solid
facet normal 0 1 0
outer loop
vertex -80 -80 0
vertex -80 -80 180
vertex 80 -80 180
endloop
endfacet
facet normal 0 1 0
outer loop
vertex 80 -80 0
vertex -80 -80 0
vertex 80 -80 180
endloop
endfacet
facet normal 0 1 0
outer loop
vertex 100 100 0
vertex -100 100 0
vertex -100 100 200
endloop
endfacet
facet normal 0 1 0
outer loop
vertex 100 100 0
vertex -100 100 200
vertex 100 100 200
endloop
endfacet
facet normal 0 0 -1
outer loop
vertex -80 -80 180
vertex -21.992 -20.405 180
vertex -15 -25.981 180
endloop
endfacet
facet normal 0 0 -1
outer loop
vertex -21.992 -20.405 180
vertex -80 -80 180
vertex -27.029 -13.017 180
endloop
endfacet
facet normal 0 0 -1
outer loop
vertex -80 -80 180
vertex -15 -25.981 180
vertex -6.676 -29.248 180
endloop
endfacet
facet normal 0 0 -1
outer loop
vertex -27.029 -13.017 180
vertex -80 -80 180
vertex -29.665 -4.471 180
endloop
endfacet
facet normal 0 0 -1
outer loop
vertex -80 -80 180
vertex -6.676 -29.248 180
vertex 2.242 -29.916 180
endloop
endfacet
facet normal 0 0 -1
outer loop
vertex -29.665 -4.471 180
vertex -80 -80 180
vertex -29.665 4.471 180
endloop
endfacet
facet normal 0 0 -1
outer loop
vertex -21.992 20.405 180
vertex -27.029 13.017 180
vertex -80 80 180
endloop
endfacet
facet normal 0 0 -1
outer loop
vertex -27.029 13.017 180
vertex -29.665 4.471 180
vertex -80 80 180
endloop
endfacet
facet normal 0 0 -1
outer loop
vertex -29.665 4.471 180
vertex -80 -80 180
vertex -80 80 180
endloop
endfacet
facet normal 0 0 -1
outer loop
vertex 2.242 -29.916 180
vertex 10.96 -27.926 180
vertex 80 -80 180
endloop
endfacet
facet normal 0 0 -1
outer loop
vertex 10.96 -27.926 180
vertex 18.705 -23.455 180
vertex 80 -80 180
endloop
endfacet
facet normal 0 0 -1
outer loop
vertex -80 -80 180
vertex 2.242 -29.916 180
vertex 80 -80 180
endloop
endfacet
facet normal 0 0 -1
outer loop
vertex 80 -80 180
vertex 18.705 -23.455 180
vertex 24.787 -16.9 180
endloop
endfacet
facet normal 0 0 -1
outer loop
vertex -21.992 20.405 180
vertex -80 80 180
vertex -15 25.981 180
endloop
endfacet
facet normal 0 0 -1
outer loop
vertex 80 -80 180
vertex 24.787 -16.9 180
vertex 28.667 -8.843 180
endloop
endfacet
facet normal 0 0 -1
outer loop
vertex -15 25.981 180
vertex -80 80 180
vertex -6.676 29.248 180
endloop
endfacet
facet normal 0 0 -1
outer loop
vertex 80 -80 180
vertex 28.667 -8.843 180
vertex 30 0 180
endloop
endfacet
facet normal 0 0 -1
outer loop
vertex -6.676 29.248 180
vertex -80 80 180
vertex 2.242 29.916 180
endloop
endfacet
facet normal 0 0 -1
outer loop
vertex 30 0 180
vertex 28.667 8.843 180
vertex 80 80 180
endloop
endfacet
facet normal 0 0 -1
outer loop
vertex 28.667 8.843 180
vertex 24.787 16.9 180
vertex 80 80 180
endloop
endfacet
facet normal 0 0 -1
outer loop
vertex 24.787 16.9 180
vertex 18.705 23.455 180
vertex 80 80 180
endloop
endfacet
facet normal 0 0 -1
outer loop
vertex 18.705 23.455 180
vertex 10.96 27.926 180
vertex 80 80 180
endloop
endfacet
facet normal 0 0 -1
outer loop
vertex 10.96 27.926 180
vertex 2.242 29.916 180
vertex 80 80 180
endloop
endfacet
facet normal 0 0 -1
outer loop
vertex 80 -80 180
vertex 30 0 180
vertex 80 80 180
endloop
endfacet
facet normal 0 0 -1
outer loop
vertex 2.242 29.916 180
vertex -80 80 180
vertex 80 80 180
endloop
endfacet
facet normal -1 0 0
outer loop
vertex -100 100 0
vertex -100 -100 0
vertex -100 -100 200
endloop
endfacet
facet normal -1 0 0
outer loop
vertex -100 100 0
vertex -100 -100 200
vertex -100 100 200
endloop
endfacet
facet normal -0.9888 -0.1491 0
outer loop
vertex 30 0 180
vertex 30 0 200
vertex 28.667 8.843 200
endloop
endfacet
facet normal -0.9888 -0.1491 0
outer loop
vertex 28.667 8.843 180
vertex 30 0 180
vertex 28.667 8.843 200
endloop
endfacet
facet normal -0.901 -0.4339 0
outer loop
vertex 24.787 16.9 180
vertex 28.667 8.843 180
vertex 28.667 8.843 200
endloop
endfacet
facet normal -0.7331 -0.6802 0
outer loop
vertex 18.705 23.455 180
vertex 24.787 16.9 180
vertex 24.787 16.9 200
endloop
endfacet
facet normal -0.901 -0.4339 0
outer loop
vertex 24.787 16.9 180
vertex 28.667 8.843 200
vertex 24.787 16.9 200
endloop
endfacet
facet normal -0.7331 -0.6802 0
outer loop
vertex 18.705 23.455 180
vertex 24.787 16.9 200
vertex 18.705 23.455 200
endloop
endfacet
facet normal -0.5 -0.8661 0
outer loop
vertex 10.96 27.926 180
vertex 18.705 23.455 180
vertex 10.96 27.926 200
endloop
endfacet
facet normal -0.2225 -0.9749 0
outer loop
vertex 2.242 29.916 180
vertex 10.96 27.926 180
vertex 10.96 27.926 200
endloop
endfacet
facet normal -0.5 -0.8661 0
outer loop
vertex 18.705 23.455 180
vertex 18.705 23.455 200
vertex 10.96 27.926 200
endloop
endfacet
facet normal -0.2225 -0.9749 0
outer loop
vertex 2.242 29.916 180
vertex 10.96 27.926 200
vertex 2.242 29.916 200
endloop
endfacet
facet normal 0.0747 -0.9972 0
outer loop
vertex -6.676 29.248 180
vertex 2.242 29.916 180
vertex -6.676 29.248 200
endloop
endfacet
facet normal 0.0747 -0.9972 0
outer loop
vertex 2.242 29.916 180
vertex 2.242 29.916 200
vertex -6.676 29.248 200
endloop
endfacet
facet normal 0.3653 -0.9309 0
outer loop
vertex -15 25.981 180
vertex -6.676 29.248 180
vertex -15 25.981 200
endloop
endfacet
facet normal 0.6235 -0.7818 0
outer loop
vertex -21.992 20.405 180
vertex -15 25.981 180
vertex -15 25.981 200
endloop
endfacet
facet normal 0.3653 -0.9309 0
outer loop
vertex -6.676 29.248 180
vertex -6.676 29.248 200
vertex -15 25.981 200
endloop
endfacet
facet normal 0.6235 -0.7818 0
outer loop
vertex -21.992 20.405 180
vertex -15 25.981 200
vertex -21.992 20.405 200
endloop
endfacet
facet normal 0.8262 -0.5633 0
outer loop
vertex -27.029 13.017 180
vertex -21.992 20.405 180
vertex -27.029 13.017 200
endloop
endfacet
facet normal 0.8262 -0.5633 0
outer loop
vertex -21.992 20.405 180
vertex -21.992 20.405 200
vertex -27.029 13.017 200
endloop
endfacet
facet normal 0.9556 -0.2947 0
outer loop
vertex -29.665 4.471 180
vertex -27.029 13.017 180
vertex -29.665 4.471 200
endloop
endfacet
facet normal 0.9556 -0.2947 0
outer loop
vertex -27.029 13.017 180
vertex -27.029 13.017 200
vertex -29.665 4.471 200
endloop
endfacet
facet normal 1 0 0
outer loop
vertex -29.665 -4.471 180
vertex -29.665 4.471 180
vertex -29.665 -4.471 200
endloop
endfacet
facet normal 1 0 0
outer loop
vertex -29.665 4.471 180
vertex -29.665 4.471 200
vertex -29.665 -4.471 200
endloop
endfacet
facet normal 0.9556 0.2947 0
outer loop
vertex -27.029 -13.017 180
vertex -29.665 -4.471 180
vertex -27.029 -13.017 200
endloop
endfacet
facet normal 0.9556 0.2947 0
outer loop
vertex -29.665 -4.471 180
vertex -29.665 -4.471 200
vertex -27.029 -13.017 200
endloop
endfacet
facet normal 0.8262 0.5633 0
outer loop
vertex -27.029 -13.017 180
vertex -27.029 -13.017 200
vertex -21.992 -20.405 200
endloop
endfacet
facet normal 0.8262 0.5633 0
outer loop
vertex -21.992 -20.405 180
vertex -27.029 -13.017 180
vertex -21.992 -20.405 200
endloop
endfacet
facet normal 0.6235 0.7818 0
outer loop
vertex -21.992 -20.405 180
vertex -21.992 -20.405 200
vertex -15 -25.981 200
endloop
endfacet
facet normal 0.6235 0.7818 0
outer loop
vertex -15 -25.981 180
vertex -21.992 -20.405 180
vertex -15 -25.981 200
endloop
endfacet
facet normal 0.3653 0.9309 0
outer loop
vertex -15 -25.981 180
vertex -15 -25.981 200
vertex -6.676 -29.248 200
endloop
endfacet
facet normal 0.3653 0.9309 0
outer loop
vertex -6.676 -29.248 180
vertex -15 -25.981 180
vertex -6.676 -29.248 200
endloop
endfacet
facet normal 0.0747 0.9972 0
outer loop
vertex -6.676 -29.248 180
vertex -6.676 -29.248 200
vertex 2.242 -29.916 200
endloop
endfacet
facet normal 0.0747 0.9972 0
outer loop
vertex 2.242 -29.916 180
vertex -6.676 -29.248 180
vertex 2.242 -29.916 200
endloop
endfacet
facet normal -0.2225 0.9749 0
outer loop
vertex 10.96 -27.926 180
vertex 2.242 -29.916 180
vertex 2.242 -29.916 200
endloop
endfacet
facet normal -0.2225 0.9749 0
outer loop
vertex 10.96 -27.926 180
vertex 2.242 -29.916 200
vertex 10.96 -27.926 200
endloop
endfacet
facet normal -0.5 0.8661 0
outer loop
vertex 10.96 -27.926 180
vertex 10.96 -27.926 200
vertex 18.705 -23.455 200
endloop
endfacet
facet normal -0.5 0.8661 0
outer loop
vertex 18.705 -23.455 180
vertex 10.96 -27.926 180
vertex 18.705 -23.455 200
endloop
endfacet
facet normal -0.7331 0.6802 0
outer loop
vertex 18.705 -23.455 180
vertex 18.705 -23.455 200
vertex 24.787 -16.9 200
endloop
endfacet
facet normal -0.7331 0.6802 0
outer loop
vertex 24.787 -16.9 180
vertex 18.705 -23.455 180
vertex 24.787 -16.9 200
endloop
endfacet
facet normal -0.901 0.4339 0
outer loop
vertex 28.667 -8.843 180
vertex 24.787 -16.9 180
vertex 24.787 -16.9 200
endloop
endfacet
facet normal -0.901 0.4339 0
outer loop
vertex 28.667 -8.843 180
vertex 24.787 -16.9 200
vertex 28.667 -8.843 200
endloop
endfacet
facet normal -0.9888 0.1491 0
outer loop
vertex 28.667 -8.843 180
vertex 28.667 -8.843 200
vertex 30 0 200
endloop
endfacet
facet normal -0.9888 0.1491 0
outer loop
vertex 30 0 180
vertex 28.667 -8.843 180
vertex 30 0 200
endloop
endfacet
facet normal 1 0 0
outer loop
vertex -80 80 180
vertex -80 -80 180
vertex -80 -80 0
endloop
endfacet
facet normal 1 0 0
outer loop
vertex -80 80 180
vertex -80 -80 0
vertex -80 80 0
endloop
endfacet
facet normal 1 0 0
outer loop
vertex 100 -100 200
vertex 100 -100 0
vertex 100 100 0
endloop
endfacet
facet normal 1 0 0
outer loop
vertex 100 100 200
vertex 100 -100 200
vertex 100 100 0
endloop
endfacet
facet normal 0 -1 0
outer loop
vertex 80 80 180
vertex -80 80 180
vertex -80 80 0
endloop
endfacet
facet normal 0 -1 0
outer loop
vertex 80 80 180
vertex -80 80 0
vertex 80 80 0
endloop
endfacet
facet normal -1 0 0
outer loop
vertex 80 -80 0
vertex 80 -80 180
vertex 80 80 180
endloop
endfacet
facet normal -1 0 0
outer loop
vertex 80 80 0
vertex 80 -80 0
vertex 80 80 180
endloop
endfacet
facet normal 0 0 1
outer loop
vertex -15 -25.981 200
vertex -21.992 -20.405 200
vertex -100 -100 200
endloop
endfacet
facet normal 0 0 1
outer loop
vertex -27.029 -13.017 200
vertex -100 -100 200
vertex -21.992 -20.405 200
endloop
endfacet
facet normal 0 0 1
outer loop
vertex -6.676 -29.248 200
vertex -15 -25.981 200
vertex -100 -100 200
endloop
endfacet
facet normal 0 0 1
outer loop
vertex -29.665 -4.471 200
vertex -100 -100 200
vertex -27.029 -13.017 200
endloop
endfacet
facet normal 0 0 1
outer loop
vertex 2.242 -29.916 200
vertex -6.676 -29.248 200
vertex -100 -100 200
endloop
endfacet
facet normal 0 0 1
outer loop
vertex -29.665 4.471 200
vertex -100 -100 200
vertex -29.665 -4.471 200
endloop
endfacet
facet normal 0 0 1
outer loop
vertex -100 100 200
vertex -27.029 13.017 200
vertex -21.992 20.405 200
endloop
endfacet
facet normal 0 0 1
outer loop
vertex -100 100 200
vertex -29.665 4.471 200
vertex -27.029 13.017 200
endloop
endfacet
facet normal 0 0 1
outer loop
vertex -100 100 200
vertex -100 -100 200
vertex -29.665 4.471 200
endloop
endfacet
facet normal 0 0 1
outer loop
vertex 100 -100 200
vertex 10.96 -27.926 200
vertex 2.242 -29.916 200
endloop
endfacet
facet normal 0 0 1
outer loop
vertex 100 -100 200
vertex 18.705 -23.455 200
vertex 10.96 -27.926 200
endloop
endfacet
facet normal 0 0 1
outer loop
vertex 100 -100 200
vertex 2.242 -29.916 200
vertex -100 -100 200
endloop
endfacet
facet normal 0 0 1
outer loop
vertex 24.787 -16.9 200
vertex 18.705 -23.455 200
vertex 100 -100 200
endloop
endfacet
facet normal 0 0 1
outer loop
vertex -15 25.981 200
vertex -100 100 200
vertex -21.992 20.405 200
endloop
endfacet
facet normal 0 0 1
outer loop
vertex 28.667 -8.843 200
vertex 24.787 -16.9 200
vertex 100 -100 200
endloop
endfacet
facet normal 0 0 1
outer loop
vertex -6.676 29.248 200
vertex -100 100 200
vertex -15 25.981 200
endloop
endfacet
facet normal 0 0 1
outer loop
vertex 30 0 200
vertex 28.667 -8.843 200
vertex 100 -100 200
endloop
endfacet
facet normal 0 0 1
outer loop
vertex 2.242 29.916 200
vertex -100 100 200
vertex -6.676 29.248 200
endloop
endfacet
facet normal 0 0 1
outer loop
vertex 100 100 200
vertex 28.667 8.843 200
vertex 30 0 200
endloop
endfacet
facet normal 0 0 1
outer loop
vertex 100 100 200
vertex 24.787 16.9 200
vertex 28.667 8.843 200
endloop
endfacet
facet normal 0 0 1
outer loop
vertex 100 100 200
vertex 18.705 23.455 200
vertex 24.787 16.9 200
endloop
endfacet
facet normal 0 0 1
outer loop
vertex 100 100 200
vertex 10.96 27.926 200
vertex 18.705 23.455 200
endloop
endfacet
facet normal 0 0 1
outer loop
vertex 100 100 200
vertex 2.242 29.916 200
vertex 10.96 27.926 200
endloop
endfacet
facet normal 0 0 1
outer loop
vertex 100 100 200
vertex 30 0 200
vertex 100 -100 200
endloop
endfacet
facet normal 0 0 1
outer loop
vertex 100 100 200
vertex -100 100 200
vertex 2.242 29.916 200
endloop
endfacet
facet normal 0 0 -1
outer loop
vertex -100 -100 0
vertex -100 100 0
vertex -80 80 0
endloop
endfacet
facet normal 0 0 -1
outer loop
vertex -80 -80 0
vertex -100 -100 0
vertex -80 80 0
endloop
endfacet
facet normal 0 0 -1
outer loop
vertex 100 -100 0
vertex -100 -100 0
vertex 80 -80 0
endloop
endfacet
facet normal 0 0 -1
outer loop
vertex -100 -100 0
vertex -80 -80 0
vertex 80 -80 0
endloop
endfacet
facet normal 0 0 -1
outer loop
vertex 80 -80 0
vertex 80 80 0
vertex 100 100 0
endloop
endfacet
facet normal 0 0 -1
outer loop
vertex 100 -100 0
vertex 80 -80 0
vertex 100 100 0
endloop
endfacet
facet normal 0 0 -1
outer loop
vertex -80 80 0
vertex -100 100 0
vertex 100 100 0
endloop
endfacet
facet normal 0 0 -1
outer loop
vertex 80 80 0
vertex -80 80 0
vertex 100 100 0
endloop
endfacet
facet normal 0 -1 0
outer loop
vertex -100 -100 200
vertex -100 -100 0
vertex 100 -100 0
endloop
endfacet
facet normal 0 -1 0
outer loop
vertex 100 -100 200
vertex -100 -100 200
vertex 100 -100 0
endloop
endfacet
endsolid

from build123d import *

# Parameters (mm, degrees)
SKETCH5_W           = 200
SKETCH5_H           = 200
BOSS_EXTRUDE2_DEPTH = 200
SHELL2_T            = -20
SKETCH6_R           = 30
CUT_EXTRUDE2_DEPTH  = 51.6


with BuildPart() as part:
    # Sketch5 → Boss-Extrude2 (new body)
    with BuildSketch(Plane.XY):
        Rectangle(SKETCH5_W, SKETCH5_H)
    extrude(amount=BOSS_EXTRUDE2_DEPTH)

    # Shell2
    shell2_openings = [part.faces().sort_by_distance(p)[0] for p in [
        (0, 0, 0),
    ]]
    offset(amount=SHELL2_T, openings=shell2_openings, kind=Kind.INTERSECTION)

    # Sketch6 → Cut-Extrude2 (cut)
    with BuildSketch(Plane.XY.offset(200)):
        Circle(SKETCH6_R)
    extrude(amount=-CUT_EXTRUDE2_DEPTH, mode=Mode.SUBTRACT)


solid = part.part
